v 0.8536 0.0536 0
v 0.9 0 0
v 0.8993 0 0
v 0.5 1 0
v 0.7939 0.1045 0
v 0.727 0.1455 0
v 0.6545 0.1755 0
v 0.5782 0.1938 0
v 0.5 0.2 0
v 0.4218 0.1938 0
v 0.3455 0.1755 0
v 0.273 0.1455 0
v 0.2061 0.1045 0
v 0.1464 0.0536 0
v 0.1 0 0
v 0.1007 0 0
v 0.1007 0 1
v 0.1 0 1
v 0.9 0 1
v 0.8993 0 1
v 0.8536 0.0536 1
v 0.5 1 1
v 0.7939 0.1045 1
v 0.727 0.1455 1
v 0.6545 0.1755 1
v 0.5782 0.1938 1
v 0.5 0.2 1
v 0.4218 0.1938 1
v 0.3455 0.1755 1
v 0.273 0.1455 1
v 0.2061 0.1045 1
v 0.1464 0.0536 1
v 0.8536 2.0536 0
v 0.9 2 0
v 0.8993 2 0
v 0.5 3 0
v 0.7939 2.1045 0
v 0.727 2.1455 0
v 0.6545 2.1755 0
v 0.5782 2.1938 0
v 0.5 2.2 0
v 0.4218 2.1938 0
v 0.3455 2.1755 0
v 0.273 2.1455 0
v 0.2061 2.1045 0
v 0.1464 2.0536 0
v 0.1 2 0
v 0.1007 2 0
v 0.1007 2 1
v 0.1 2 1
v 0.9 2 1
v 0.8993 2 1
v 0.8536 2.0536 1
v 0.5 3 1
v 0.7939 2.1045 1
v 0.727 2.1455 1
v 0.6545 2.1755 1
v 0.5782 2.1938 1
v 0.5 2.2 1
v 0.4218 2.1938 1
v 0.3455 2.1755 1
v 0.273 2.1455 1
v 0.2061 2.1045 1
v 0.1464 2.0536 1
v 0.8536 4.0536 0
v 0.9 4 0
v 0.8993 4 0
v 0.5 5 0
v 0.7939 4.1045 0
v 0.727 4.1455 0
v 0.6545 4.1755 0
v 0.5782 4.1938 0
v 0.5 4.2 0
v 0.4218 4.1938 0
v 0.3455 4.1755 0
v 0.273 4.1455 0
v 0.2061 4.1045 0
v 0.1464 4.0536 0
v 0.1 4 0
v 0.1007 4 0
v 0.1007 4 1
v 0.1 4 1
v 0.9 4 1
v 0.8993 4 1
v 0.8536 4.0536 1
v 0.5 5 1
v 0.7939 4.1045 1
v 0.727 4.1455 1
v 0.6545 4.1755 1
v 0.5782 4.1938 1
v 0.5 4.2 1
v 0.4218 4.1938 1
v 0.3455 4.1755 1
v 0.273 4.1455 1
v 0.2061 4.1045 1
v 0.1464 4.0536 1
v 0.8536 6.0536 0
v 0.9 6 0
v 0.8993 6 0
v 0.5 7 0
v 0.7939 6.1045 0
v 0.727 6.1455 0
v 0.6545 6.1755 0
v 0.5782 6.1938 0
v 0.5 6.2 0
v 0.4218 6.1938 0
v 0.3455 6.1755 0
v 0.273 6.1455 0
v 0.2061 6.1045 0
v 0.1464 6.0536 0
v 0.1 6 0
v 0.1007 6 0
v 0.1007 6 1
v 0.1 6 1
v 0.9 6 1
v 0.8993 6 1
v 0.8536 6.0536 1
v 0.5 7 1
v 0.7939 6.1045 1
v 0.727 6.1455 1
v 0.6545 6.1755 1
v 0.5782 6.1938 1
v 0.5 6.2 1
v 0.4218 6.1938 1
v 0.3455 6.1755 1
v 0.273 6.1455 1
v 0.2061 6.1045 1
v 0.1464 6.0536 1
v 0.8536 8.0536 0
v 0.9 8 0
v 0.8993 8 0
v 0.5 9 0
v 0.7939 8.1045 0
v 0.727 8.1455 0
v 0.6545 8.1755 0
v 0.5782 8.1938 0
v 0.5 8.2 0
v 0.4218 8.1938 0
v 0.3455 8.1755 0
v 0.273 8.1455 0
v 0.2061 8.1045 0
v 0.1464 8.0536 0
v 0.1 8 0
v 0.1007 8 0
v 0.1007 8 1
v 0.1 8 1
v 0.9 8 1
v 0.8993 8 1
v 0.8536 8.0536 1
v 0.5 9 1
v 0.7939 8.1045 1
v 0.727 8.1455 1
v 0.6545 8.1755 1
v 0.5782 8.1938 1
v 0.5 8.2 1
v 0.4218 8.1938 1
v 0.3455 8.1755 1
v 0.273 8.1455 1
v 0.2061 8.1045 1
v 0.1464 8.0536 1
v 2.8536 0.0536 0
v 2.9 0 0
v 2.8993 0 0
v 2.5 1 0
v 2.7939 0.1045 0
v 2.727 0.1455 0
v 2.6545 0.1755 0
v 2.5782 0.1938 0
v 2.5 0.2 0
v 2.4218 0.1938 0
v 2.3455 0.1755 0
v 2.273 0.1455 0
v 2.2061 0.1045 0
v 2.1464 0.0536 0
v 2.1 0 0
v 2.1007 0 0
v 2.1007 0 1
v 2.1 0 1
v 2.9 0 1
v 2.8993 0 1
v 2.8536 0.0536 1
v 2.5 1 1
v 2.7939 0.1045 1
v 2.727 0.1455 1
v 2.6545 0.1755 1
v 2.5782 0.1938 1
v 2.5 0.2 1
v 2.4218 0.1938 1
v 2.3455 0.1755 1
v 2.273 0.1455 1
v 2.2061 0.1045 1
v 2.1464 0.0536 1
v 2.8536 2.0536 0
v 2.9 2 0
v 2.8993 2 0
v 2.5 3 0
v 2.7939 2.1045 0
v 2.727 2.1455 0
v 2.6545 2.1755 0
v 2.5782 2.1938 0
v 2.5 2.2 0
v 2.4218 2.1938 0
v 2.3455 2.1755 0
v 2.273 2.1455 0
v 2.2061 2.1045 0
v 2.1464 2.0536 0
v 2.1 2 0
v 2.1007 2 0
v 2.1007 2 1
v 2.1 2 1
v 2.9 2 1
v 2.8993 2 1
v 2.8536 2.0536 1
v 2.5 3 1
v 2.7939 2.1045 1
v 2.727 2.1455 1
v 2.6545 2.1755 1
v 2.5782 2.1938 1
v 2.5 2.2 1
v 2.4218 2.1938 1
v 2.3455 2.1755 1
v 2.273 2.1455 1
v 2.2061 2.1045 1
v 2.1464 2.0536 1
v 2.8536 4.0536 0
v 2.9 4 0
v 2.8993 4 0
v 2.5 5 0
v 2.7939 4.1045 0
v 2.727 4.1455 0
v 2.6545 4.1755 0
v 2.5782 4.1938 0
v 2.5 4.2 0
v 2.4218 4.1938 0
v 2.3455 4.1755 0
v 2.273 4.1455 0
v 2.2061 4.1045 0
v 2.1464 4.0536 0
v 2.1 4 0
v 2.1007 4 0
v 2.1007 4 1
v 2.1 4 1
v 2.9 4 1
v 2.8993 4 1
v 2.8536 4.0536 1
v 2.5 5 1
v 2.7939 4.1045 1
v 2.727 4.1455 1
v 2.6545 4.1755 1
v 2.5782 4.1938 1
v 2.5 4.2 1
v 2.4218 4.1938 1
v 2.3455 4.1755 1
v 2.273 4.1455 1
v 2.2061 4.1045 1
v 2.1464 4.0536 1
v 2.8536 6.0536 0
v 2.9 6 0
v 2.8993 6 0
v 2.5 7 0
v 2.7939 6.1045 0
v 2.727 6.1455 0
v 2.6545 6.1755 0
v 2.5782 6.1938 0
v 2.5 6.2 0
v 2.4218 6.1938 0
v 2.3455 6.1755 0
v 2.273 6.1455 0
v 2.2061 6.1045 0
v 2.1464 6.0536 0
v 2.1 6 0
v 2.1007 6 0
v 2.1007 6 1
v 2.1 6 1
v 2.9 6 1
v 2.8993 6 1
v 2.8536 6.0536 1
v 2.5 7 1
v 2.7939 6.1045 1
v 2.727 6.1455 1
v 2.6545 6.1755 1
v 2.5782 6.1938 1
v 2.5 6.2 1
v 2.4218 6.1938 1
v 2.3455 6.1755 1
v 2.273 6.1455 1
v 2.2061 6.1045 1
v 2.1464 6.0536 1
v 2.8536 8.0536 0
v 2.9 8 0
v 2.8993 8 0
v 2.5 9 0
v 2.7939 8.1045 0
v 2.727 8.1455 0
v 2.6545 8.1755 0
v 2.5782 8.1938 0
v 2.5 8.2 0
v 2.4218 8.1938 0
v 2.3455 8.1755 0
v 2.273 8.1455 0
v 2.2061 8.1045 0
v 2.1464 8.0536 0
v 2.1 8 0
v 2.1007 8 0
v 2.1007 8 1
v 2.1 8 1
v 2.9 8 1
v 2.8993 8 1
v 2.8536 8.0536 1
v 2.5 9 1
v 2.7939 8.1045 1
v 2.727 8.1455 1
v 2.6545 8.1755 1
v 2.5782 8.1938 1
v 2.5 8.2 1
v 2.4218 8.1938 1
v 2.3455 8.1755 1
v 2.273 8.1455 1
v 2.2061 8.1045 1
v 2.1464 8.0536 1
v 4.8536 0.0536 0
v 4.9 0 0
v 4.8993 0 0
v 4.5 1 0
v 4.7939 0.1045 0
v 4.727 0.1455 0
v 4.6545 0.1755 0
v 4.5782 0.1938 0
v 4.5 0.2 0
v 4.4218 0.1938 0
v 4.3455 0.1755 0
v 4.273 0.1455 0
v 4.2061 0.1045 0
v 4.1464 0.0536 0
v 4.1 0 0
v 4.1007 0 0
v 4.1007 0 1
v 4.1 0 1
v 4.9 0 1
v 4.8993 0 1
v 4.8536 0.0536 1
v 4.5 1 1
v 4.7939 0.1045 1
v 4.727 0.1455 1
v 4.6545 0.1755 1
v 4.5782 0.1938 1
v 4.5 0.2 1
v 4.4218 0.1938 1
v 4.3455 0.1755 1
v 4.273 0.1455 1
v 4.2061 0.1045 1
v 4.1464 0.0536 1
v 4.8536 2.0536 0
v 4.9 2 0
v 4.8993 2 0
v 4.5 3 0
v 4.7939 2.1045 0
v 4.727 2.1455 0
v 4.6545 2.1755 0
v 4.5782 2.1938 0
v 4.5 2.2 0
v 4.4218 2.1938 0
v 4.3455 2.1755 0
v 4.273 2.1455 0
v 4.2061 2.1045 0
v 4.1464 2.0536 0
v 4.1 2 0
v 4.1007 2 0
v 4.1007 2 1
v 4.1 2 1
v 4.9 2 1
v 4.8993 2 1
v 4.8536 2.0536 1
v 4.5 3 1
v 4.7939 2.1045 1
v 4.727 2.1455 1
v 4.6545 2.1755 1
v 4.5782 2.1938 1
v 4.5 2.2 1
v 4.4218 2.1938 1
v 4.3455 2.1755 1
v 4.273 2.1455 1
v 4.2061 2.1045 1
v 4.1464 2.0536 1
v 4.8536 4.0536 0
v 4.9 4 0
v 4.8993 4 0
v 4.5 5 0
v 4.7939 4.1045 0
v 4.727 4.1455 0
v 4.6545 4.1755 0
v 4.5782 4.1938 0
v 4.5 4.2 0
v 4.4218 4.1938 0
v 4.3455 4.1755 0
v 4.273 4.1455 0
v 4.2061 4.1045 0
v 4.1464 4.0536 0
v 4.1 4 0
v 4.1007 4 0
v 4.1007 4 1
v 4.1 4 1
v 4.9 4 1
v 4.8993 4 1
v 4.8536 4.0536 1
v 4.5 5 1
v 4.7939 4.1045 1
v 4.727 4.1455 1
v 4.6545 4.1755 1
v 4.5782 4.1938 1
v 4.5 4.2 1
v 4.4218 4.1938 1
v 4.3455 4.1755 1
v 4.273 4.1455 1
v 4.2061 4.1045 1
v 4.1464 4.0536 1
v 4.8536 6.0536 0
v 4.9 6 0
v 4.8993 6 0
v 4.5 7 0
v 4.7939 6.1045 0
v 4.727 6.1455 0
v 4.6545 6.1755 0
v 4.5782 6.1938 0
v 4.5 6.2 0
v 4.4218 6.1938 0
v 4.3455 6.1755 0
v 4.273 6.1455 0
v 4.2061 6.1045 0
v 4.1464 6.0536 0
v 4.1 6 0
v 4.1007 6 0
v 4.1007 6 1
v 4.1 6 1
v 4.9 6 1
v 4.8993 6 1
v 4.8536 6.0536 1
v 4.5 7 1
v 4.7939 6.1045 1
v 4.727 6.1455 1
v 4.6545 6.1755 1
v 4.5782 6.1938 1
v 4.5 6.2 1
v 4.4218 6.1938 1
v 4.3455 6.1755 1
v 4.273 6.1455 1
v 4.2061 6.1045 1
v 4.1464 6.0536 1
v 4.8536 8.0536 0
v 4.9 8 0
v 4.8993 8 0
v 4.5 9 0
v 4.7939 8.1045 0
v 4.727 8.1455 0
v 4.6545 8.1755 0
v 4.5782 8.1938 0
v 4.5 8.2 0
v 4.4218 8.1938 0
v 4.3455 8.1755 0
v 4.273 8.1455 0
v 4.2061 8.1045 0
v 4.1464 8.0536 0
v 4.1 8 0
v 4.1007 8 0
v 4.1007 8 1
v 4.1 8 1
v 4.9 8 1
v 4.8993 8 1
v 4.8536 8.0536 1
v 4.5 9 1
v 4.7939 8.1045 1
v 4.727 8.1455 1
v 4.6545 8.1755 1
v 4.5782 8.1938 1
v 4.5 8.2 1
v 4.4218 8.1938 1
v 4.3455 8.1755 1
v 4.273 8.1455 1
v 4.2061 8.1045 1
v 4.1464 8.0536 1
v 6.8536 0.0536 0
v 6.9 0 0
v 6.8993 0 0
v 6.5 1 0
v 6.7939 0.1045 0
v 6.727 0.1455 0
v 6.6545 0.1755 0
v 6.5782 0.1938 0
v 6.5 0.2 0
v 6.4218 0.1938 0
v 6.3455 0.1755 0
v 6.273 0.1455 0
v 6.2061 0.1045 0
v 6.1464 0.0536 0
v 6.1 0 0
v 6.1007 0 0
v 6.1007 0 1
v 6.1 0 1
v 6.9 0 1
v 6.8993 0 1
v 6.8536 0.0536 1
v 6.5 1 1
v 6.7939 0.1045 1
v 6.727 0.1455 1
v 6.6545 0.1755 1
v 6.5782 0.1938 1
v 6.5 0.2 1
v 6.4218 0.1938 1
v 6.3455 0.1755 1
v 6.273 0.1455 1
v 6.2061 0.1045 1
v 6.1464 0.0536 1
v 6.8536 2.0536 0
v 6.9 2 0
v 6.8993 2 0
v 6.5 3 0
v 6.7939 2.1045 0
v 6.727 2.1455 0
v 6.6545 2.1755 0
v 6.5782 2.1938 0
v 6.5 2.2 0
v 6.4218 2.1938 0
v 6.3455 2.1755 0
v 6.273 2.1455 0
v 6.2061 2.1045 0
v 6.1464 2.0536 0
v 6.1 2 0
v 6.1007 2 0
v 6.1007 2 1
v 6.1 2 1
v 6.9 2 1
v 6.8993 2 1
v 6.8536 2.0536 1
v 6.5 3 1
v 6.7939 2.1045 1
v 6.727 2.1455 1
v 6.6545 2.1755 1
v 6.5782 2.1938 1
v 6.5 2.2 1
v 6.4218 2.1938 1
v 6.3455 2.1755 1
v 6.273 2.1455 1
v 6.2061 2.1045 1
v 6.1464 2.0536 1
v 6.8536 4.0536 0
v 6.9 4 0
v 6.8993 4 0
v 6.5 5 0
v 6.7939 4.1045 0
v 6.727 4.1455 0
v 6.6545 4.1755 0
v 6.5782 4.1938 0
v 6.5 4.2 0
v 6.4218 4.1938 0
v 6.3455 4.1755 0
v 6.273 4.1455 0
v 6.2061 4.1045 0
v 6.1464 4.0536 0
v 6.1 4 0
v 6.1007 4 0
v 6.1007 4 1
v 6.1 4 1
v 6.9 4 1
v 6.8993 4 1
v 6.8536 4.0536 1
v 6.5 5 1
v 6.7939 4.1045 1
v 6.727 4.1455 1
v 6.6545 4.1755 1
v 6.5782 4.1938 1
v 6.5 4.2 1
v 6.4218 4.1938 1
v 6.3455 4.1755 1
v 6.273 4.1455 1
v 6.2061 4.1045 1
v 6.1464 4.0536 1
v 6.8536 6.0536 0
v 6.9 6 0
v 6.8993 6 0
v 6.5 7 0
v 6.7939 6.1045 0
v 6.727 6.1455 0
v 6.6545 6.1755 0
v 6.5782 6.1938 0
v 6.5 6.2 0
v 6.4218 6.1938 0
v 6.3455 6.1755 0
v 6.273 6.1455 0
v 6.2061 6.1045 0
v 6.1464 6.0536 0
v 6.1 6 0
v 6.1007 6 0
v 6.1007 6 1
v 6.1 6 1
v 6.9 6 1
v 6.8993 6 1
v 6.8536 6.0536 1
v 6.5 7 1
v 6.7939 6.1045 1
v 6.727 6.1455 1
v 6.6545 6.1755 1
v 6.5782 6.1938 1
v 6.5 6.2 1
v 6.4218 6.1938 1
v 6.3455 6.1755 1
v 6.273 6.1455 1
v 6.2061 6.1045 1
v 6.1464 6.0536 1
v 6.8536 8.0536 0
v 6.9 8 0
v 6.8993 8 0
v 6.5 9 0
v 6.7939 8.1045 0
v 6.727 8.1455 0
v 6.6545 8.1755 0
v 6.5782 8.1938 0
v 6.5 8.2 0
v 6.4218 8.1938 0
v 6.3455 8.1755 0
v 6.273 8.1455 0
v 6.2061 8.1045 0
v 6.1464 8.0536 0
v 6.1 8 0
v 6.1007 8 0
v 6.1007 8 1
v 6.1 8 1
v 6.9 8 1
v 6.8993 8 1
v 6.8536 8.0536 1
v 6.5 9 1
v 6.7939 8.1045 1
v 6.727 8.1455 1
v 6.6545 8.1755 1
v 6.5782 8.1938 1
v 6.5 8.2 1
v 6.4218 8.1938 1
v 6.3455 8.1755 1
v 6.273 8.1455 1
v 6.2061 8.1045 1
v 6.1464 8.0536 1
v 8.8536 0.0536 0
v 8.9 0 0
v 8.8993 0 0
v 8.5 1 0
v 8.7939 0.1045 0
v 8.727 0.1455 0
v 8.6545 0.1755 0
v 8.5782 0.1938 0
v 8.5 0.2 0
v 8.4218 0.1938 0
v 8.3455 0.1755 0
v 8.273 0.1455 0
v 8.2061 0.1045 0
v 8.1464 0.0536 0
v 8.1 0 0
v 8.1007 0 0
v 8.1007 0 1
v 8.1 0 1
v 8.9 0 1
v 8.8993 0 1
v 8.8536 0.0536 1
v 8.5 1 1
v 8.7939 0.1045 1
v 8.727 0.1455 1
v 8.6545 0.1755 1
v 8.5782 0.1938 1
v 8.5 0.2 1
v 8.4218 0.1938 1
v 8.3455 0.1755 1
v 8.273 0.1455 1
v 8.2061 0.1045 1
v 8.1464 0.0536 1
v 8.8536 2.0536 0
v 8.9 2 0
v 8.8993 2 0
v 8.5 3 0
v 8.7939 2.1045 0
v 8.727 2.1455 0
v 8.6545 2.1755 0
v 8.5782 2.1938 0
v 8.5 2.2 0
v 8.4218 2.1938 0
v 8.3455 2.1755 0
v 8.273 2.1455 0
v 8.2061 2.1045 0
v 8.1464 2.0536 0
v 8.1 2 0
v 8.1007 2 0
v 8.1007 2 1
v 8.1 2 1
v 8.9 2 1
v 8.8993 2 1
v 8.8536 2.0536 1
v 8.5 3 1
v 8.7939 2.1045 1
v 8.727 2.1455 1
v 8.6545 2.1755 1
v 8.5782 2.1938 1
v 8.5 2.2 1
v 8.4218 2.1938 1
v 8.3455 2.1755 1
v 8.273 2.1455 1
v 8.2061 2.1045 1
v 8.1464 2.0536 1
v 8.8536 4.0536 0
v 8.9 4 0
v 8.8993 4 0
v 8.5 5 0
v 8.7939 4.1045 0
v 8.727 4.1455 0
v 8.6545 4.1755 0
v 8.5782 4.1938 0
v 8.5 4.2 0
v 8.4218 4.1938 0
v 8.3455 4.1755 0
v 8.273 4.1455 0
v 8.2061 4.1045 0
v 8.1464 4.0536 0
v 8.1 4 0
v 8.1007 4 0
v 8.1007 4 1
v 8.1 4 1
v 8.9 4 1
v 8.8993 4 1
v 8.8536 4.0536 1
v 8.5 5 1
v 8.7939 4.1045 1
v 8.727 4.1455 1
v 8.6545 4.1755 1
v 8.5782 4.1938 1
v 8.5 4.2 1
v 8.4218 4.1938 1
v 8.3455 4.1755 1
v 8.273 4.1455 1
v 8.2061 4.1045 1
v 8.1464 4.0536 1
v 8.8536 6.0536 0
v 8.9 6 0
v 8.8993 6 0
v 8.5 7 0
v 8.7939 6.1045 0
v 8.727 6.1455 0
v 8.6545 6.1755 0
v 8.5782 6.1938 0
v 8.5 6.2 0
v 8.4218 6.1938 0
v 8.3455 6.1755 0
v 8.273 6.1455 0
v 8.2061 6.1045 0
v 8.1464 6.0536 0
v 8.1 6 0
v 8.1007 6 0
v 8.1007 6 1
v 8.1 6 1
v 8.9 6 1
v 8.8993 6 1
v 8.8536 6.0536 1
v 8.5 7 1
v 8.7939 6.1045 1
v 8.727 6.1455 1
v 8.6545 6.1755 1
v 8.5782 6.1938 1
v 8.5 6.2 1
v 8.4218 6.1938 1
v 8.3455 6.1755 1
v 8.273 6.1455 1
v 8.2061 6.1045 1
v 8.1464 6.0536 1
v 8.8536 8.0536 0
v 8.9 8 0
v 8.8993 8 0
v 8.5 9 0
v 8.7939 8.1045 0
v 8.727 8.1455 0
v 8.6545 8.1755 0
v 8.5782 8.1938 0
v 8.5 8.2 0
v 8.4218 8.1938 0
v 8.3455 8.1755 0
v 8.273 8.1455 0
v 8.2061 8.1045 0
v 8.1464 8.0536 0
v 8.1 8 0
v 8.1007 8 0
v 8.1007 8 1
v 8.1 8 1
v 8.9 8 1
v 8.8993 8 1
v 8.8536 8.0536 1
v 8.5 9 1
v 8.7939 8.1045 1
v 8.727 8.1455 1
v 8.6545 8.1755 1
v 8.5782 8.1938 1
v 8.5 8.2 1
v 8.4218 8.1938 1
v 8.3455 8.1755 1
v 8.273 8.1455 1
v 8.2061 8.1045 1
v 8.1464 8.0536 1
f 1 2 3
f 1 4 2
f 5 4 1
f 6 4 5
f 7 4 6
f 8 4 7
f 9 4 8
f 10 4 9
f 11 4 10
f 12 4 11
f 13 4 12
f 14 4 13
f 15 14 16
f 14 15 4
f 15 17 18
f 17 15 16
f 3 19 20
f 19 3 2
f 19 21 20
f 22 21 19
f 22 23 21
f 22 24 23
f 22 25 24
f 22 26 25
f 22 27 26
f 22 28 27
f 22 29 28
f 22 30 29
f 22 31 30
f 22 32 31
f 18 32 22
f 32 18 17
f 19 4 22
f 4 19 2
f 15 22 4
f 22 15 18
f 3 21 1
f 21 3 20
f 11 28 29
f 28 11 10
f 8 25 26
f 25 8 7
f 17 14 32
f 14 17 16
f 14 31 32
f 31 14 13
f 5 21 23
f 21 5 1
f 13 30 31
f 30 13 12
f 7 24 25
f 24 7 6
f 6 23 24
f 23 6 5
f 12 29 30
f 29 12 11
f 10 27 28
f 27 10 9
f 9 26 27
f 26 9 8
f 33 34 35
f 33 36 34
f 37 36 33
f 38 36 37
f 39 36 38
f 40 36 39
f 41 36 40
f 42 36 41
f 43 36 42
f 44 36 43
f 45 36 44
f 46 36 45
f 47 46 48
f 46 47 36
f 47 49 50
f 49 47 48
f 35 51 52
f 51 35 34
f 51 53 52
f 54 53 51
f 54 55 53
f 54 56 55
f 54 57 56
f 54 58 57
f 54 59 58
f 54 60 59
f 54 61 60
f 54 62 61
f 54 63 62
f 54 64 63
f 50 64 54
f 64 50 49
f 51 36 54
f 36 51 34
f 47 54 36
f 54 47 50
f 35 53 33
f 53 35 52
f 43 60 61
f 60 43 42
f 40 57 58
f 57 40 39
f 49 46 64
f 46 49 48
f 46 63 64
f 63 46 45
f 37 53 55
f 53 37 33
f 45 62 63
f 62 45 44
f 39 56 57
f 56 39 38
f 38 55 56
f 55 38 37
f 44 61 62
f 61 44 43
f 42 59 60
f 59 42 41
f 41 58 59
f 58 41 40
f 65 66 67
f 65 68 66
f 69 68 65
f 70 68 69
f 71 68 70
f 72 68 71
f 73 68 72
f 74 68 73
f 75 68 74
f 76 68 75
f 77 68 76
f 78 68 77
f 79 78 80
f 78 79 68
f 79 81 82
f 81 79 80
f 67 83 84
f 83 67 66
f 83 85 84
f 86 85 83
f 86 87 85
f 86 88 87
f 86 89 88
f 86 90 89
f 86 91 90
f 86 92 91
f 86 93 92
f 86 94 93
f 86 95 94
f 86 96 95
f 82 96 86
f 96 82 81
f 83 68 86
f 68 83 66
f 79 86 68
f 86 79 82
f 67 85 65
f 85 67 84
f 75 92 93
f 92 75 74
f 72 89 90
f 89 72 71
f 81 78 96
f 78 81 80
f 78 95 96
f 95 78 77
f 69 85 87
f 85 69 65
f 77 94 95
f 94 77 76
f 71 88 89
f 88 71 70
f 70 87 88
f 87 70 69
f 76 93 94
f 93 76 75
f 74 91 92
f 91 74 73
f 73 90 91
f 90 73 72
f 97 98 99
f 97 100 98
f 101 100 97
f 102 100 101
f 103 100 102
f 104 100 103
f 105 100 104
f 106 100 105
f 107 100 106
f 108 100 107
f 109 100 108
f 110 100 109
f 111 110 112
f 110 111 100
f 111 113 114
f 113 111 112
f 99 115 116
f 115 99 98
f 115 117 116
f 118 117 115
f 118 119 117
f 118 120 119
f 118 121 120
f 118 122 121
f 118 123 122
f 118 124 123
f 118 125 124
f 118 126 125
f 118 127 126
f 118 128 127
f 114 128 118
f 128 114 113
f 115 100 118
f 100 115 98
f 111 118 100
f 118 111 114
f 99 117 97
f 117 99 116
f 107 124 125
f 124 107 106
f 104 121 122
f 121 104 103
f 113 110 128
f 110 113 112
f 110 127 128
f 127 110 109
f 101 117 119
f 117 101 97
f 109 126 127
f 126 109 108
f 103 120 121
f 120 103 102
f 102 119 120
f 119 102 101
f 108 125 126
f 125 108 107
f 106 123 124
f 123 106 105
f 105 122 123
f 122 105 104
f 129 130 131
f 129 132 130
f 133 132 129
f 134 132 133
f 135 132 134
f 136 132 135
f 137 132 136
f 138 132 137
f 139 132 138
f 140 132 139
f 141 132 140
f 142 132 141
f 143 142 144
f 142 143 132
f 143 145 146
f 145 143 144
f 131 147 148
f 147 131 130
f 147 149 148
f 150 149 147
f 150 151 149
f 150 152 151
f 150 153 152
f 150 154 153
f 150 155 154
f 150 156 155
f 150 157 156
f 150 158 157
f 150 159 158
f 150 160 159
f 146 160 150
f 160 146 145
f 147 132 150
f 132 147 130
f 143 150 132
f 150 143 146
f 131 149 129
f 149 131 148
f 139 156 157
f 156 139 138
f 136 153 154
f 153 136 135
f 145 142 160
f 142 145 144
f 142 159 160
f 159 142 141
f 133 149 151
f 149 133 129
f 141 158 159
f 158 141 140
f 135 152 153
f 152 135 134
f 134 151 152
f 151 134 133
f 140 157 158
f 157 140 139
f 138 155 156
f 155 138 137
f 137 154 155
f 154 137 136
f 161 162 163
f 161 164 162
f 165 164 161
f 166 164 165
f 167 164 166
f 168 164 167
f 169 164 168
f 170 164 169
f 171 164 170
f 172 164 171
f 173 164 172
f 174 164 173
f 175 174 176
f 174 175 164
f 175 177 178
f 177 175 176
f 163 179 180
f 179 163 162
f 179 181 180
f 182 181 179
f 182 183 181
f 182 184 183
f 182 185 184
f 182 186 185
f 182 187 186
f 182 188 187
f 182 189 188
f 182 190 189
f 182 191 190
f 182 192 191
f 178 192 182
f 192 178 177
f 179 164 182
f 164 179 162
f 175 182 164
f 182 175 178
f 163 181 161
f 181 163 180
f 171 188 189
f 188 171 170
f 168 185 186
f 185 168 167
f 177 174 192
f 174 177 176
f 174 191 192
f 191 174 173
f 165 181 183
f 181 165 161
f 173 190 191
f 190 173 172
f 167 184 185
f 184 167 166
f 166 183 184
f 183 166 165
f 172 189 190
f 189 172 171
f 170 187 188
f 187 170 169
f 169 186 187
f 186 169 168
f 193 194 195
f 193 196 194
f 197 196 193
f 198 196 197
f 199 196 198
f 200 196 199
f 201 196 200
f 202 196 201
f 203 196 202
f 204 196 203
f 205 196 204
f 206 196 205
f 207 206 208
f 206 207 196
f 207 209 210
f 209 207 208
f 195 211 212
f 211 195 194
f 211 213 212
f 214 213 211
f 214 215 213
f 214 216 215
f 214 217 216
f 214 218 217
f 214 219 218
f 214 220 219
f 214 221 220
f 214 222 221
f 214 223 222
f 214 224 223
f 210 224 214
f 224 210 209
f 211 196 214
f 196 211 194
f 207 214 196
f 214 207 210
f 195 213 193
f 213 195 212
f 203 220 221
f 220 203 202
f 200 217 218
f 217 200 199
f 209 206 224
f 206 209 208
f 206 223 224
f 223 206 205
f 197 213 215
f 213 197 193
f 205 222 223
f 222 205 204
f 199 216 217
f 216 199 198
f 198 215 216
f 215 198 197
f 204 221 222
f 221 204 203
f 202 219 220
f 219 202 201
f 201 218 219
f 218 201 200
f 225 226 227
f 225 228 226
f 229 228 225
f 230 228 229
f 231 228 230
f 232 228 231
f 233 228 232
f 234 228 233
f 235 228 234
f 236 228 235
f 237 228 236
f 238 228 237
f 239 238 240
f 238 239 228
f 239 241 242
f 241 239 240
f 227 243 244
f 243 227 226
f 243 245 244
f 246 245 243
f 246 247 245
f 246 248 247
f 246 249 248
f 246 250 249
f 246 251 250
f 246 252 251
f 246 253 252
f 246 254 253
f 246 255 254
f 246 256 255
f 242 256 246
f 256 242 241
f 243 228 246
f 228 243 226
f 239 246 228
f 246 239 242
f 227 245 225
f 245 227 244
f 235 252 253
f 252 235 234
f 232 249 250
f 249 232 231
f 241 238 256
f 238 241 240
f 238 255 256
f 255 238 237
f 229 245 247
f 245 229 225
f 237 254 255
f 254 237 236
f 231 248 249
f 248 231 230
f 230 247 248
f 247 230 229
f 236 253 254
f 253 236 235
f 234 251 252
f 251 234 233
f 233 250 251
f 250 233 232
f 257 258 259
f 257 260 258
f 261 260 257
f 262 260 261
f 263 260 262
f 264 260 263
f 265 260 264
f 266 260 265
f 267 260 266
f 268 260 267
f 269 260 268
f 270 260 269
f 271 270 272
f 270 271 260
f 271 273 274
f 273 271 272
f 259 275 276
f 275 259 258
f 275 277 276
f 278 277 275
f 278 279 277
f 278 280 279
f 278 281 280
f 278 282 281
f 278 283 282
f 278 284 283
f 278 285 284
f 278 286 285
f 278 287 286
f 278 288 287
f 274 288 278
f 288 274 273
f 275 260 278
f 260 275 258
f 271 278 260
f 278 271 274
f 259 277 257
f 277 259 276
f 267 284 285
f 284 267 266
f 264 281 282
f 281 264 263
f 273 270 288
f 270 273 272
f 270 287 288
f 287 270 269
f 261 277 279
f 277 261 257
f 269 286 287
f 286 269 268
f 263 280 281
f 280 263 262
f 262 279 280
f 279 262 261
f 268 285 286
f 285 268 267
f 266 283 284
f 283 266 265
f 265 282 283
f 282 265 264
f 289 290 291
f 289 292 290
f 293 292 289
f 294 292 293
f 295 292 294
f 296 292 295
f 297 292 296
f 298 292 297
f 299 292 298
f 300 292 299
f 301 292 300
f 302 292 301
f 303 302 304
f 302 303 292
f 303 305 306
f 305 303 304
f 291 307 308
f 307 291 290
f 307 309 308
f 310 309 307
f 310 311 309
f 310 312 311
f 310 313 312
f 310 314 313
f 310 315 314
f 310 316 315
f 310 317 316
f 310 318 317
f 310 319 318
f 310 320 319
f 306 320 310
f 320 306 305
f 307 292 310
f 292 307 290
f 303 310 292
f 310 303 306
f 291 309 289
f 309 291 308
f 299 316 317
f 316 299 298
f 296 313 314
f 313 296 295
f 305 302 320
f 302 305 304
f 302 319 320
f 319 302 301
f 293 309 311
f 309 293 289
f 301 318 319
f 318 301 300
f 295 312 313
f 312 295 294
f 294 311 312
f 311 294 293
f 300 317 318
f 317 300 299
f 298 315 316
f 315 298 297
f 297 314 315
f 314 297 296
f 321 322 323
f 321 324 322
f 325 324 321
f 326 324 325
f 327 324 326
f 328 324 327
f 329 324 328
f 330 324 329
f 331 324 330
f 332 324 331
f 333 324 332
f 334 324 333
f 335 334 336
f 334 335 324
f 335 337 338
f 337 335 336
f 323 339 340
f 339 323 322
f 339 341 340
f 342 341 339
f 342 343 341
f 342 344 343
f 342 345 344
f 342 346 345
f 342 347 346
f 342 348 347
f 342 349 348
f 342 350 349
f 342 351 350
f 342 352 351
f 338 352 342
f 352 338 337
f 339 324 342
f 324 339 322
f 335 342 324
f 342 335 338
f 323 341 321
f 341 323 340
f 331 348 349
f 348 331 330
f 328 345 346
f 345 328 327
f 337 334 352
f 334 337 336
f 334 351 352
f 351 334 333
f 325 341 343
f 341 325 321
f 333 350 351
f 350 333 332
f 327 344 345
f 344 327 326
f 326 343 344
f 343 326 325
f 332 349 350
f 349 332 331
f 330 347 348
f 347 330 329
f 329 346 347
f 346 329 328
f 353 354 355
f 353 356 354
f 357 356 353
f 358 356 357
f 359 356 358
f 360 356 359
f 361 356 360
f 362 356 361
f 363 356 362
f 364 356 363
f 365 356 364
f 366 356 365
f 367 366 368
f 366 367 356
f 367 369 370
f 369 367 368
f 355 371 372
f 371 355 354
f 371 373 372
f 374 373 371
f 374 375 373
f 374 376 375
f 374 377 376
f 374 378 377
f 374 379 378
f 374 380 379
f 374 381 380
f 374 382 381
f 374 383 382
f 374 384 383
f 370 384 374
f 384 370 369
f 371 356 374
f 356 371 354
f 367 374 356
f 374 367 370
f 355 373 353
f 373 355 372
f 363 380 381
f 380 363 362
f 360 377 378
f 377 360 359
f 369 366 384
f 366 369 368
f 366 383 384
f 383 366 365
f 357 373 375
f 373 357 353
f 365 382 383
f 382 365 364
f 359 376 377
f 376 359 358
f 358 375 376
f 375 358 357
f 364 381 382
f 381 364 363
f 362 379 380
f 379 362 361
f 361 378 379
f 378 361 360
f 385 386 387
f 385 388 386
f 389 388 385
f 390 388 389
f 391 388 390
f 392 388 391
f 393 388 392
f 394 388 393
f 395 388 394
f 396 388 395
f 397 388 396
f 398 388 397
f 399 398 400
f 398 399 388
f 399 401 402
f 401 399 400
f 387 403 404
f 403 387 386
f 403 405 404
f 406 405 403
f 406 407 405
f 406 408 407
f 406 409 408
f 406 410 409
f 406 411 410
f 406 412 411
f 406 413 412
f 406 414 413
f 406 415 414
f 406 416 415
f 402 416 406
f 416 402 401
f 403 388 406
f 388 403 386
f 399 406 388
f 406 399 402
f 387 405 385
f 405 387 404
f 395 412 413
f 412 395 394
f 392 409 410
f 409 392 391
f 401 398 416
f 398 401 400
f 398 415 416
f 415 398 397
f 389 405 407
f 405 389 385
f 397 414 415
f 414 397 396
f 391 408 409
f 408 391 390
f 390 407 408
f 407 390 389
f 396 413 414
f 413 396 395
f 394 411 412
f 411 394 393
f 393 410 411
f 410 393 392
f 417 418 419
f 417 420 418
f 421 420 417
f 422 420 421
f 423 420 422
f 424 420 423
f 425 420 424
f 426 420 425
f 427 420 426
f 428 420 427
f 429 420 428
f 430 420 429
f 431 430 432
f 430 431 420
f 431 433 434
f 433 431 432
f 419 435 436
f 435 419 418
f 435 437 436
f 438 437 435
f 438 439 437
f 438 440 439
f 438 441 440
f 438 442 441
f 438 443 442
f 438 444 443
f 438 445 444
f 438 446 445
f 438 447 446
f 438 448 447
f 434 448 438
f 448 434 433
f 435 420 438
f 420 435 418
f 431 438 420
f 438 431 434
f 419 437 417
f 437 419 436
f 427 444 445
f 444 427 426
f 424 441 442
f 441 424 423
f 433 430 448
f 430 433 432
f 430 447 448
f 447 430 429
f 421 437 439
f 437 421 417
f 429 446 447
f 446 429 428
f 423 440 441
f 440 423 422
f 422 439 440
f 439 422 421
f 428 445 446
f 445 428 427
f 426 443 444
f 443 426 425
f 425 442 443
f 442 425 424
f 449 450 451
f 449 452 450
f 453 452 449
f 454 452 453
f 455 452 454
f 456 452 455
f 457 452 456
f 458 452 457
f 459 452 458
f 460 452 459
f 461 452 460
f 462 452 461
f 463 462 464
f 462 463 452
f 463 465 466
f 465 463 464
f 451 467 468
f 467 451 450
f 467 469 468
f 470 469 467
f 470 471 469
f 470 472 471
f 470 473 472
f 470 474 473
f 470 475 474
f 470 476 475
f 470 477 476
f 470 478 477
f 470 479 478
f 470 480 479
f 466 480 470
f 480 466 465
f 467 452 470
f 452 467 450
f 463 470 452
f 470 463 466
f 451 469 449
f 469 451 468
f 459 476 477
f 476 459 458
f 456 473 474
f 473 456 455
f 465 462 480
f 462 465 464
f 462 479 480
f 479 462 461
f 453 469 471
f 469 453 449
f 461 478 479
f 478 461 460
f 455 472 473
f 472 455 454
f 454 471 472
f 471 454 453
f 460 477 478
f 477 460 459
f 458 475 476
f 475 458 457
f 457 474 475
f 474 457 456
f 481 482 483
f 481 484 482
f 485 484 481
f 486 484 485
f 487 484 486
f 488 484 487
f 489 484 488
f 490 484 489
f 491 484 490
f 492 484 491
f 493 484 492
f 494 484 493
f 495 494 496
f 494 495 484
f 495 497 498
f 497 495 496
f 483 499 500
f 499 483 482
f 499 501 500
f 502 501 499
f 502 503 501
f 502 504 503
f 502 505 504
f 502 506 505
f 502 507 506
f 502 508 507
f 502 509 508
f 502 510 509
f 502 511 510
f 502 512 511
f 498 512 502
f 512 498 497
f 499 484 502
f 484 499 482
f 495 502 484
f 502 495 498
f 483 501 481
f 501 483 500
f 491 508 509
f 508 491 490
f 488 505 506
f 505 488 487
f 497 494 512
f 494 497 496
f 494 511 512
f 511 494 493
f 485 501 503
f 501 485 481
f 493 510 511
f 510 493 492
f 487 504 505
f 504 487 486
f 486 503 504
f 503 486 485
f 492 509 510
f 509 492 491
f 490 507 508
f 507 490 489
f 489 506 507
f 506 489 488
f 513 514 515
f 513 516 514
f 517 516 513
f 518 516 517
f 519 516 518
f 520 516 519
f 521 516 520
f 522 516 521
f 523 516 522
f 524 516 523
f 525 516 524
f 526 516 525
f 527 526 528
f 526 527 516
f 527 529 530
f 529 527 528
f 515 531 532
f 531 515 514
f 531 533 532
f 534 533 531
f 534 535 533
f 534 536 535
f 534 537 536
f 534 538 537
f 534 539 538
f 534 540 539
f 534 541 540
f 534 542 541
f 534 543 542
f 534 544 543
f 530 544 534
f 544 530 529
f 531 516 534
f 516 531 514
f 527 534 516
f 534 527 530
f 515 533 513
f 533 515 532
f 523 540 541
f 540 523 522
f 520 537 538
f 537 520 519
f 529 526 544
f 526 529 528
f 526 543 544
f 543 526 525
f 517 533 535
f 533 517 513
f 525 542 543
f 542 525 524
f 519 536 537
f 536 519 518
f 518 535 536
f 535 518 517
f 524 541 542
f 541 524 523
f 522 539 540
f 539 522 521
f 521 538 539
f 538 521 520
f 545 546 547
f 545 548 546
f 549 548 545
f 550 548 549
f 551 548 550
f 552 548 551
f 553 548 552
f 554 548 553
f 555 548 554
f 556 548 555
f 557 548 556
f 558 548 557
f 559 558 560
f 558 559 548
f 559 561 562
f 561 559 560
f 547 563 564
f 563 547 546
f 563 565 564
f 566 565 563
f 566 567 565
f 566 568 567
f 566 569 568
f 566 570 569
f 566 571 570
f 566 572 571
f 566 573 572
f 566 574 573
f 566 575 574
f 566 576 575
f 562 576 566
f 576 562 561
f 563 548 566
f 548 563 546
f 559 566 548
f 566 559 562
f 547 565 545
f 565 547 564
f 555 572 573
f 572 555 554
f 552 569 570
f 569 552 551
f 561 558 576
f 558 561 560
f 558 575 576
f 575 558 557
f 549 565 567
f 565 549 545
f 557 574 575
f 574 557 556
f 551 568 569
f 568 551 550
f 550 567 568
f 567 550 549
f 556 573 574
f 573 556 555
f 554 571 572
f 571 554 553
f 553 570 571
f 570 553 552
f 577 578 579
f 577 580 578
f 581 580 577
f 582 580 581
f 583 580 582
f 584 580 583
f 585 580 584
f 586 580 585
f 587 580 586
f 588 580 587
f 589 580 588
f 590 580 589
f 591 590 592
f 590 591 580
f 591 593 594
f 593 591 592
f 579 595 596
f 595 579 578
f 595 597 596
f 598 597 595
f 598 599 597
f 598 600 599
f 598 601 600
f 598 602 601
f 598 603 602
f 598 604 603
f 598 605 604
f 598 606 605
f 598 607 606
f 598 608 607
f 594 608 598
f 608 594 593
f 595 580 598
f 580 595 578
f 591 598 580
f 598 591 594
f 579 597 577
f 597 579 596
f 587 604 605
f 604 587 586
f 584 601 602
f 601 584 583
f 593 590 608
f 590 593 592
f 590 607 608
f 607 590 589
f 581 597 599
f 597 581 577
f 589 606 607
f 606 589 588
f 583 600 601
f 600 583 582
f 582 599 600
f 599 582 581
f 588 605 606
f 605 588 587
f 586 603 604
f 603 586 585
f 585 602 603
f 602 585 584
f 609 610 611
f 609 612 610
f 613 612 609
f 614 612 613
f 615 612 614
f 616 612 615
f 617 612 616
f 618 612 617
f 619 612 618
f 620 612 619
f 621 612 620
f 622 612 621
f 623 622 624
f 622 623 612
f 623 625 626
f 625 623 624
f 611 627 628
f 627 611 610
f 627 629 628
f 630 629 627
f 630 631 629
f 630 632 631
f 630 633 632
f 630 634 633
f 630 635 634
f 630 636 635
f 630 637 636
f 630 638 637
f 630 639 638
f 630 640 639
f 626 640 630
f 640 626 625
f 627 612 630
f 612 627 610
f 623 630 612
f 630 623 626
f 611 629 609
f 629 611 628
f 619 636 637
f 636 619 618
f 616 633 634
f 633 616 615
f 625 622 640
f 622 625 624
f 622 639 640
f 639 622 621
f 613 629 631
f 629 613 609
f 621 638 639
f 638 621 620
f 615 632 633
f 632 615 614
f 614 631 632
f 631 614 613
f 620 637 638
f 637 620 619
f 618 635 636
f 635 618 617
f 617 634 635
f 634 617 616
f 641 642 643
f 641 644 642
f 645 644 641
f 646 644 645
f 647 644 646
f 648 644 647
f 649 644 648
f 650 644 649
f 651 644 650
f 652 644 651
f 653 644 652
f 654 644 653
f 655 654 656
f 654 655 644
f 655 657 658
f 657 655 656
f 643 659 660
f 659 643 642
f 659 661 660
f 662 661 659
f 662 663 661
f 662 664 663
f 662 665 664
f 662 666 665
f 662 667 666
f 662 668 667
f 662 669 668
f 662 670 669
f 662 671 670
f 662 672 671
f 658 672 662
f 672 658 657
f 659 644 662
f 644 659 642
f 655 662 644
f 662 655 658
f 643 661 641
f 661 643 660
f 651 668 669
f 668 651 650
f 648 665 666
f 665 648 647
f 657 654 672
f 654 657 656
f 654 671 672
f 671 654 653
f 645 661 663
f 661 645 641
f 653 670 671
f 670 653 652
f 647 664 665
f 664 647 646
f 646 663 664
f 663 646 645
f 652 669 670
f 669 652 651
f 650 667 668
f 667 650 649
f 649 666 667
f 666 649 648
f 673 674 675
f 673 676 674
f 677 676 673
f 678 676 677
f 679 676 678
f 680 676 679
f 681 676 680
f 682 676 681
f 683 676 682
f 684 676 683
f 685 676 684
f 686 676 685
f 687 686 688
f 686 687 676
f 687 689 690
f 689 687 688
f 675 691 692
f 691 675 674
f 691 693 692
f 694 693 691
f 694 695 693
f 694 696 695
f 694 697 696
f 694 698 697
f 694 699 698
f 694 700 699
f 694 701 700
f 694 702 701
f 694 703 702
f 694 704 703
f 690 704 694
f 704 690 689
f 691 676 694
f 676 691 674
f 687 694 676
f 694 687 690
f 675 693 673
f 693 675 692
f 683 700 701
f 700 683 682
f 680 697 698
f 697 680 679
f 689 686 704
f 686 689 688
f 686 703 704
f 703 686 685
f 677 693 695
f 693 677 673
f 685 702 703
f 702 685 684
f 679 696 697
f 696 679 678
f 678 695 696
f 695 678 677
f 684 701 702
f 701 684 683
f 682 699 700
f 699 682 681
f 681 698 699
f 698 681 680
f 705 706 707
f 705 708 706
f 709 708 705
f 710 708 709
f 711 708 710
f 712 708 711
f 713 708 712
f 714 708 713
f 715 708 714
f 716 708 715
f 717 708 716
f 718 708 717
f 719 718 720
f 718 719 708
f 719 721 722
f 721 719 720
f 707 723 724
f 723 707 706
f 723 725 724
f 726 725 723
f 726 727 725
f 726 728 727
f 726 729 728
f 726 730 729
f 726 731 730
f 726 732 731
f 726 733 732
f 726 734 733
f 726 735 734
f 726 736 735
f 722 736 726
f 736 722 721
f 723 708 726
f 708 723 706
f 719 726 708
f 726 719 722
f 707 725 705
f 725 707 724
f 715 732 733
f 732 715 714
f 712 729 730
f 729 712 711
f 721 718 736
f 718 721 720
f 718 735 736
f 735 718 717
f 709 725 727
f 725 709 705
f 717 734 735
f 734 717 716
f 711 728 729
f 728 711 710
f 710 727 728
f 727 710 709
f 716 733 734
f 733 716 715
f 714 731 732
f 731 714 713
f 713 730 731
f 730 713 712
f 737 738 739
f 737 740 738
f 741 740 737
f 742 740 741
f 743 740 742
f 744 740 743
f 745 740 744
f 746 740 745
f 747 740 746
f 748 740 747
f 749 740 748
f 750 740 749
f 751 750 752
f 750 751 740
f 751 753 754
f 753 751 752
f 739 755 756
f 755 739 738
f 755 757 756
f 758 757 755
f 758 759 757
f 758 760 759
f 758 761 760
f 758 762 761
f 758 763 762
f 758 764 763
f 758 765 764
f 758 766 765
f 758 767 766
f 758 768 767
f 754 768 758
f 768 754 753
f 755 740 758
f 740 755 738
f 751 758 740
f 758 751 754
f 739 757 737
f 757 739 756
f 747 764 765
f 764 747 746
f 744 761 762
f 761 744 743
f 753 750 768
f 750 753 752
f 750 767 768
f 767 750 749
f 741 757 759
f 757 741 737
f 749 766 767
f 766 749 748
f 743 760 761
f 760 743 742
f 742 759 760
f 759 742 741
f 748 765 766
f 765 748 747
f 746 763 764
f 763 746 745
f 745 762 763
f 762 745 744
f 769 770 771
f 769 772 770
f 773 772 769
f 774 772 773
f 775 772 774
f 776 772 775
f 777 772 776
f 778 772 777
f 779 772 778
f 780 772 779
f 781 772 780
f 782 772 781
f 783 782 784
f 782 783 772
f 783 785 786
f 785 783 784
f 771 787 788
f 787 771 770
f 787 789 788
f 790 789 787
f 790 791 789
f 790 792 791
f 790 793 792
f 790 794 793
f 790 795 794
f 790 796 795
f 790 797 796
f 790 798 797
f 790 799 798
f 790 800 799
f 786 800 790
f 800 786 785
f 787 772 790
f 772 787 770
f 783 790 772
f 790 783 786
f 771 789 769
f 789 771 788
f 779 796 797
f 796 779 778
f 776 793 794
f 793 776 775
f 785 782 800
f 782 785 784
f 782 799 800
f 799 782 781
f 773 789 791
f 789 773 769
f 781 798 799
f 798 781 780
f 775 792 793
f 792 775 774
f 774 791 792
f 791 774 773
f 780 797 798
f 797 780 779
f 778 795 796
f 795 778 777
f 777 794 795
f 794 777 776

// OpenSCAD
X=10;
Y=10;
pat=0;
x=1;
y=1;
shape=0;
side=1;
h=1;


module shape(shape,side,h){
r = side;

	if(shape==0){
		difference(){
			linear_extrude(height = h){
				polygon(points=[[r*.1,0],[r*.9,0],[sin(30)*r,r]],triangle=[[0,1,2]]);
			}
			translate([r/2,-r*.3,-.1]){
				cylinder(r=side/2,h=h*2,$fn=40);
			}
		}
	}

	if(shape==1){
		translate([side/2,side/2,-.1]){
			cylinder(r=side/2,h=h*2,$fn=40);
		}
	}

	if(shape==2){
		cube([side,side,h]);
	}
	if(shape==3){
		cube([side,side,h]);
	}

}
module pattern(X,Y,pat,x,y,shape,side,h){
horizontal=X/(x+side);
vertical=Y/(y+side);
	if(pat==0){
		for(i=[0:horizontal-1]){
			translate([(side+x)*i,0,0]){
				for(j=[0:vertical-1]){
					translate([0,(side+y)*j,0]){
						 shape(shape,side,h);
					}
				}
			}
		}
	}
	if(pat==1){
		for(i=[0:horizontal-1]){
			translate([(side+x)*i,0,0]){
				for(j=[0:vertical-1]){
					translate([0,(side+y)*j,0]){
						 shape(shape,side,h);
					}
				}
			}
		}
		for(i=[0:horizontal-1]){
			translate([(side+x)*i+(side+x)/2,0,0]){
				for(j=[0:vertical-1]){
					translate([0,(side+y)*j+(side+y)/2,0]){
						 shape(shape,side,h);
					}
				}
			}
		}
	}
}

//shape(shape,side,h);
pattern(X,Y,pat,x,y,shape,side,h);


//color("black")cube([side,side,.1]);
//
%cube([X,Y,.1]);
